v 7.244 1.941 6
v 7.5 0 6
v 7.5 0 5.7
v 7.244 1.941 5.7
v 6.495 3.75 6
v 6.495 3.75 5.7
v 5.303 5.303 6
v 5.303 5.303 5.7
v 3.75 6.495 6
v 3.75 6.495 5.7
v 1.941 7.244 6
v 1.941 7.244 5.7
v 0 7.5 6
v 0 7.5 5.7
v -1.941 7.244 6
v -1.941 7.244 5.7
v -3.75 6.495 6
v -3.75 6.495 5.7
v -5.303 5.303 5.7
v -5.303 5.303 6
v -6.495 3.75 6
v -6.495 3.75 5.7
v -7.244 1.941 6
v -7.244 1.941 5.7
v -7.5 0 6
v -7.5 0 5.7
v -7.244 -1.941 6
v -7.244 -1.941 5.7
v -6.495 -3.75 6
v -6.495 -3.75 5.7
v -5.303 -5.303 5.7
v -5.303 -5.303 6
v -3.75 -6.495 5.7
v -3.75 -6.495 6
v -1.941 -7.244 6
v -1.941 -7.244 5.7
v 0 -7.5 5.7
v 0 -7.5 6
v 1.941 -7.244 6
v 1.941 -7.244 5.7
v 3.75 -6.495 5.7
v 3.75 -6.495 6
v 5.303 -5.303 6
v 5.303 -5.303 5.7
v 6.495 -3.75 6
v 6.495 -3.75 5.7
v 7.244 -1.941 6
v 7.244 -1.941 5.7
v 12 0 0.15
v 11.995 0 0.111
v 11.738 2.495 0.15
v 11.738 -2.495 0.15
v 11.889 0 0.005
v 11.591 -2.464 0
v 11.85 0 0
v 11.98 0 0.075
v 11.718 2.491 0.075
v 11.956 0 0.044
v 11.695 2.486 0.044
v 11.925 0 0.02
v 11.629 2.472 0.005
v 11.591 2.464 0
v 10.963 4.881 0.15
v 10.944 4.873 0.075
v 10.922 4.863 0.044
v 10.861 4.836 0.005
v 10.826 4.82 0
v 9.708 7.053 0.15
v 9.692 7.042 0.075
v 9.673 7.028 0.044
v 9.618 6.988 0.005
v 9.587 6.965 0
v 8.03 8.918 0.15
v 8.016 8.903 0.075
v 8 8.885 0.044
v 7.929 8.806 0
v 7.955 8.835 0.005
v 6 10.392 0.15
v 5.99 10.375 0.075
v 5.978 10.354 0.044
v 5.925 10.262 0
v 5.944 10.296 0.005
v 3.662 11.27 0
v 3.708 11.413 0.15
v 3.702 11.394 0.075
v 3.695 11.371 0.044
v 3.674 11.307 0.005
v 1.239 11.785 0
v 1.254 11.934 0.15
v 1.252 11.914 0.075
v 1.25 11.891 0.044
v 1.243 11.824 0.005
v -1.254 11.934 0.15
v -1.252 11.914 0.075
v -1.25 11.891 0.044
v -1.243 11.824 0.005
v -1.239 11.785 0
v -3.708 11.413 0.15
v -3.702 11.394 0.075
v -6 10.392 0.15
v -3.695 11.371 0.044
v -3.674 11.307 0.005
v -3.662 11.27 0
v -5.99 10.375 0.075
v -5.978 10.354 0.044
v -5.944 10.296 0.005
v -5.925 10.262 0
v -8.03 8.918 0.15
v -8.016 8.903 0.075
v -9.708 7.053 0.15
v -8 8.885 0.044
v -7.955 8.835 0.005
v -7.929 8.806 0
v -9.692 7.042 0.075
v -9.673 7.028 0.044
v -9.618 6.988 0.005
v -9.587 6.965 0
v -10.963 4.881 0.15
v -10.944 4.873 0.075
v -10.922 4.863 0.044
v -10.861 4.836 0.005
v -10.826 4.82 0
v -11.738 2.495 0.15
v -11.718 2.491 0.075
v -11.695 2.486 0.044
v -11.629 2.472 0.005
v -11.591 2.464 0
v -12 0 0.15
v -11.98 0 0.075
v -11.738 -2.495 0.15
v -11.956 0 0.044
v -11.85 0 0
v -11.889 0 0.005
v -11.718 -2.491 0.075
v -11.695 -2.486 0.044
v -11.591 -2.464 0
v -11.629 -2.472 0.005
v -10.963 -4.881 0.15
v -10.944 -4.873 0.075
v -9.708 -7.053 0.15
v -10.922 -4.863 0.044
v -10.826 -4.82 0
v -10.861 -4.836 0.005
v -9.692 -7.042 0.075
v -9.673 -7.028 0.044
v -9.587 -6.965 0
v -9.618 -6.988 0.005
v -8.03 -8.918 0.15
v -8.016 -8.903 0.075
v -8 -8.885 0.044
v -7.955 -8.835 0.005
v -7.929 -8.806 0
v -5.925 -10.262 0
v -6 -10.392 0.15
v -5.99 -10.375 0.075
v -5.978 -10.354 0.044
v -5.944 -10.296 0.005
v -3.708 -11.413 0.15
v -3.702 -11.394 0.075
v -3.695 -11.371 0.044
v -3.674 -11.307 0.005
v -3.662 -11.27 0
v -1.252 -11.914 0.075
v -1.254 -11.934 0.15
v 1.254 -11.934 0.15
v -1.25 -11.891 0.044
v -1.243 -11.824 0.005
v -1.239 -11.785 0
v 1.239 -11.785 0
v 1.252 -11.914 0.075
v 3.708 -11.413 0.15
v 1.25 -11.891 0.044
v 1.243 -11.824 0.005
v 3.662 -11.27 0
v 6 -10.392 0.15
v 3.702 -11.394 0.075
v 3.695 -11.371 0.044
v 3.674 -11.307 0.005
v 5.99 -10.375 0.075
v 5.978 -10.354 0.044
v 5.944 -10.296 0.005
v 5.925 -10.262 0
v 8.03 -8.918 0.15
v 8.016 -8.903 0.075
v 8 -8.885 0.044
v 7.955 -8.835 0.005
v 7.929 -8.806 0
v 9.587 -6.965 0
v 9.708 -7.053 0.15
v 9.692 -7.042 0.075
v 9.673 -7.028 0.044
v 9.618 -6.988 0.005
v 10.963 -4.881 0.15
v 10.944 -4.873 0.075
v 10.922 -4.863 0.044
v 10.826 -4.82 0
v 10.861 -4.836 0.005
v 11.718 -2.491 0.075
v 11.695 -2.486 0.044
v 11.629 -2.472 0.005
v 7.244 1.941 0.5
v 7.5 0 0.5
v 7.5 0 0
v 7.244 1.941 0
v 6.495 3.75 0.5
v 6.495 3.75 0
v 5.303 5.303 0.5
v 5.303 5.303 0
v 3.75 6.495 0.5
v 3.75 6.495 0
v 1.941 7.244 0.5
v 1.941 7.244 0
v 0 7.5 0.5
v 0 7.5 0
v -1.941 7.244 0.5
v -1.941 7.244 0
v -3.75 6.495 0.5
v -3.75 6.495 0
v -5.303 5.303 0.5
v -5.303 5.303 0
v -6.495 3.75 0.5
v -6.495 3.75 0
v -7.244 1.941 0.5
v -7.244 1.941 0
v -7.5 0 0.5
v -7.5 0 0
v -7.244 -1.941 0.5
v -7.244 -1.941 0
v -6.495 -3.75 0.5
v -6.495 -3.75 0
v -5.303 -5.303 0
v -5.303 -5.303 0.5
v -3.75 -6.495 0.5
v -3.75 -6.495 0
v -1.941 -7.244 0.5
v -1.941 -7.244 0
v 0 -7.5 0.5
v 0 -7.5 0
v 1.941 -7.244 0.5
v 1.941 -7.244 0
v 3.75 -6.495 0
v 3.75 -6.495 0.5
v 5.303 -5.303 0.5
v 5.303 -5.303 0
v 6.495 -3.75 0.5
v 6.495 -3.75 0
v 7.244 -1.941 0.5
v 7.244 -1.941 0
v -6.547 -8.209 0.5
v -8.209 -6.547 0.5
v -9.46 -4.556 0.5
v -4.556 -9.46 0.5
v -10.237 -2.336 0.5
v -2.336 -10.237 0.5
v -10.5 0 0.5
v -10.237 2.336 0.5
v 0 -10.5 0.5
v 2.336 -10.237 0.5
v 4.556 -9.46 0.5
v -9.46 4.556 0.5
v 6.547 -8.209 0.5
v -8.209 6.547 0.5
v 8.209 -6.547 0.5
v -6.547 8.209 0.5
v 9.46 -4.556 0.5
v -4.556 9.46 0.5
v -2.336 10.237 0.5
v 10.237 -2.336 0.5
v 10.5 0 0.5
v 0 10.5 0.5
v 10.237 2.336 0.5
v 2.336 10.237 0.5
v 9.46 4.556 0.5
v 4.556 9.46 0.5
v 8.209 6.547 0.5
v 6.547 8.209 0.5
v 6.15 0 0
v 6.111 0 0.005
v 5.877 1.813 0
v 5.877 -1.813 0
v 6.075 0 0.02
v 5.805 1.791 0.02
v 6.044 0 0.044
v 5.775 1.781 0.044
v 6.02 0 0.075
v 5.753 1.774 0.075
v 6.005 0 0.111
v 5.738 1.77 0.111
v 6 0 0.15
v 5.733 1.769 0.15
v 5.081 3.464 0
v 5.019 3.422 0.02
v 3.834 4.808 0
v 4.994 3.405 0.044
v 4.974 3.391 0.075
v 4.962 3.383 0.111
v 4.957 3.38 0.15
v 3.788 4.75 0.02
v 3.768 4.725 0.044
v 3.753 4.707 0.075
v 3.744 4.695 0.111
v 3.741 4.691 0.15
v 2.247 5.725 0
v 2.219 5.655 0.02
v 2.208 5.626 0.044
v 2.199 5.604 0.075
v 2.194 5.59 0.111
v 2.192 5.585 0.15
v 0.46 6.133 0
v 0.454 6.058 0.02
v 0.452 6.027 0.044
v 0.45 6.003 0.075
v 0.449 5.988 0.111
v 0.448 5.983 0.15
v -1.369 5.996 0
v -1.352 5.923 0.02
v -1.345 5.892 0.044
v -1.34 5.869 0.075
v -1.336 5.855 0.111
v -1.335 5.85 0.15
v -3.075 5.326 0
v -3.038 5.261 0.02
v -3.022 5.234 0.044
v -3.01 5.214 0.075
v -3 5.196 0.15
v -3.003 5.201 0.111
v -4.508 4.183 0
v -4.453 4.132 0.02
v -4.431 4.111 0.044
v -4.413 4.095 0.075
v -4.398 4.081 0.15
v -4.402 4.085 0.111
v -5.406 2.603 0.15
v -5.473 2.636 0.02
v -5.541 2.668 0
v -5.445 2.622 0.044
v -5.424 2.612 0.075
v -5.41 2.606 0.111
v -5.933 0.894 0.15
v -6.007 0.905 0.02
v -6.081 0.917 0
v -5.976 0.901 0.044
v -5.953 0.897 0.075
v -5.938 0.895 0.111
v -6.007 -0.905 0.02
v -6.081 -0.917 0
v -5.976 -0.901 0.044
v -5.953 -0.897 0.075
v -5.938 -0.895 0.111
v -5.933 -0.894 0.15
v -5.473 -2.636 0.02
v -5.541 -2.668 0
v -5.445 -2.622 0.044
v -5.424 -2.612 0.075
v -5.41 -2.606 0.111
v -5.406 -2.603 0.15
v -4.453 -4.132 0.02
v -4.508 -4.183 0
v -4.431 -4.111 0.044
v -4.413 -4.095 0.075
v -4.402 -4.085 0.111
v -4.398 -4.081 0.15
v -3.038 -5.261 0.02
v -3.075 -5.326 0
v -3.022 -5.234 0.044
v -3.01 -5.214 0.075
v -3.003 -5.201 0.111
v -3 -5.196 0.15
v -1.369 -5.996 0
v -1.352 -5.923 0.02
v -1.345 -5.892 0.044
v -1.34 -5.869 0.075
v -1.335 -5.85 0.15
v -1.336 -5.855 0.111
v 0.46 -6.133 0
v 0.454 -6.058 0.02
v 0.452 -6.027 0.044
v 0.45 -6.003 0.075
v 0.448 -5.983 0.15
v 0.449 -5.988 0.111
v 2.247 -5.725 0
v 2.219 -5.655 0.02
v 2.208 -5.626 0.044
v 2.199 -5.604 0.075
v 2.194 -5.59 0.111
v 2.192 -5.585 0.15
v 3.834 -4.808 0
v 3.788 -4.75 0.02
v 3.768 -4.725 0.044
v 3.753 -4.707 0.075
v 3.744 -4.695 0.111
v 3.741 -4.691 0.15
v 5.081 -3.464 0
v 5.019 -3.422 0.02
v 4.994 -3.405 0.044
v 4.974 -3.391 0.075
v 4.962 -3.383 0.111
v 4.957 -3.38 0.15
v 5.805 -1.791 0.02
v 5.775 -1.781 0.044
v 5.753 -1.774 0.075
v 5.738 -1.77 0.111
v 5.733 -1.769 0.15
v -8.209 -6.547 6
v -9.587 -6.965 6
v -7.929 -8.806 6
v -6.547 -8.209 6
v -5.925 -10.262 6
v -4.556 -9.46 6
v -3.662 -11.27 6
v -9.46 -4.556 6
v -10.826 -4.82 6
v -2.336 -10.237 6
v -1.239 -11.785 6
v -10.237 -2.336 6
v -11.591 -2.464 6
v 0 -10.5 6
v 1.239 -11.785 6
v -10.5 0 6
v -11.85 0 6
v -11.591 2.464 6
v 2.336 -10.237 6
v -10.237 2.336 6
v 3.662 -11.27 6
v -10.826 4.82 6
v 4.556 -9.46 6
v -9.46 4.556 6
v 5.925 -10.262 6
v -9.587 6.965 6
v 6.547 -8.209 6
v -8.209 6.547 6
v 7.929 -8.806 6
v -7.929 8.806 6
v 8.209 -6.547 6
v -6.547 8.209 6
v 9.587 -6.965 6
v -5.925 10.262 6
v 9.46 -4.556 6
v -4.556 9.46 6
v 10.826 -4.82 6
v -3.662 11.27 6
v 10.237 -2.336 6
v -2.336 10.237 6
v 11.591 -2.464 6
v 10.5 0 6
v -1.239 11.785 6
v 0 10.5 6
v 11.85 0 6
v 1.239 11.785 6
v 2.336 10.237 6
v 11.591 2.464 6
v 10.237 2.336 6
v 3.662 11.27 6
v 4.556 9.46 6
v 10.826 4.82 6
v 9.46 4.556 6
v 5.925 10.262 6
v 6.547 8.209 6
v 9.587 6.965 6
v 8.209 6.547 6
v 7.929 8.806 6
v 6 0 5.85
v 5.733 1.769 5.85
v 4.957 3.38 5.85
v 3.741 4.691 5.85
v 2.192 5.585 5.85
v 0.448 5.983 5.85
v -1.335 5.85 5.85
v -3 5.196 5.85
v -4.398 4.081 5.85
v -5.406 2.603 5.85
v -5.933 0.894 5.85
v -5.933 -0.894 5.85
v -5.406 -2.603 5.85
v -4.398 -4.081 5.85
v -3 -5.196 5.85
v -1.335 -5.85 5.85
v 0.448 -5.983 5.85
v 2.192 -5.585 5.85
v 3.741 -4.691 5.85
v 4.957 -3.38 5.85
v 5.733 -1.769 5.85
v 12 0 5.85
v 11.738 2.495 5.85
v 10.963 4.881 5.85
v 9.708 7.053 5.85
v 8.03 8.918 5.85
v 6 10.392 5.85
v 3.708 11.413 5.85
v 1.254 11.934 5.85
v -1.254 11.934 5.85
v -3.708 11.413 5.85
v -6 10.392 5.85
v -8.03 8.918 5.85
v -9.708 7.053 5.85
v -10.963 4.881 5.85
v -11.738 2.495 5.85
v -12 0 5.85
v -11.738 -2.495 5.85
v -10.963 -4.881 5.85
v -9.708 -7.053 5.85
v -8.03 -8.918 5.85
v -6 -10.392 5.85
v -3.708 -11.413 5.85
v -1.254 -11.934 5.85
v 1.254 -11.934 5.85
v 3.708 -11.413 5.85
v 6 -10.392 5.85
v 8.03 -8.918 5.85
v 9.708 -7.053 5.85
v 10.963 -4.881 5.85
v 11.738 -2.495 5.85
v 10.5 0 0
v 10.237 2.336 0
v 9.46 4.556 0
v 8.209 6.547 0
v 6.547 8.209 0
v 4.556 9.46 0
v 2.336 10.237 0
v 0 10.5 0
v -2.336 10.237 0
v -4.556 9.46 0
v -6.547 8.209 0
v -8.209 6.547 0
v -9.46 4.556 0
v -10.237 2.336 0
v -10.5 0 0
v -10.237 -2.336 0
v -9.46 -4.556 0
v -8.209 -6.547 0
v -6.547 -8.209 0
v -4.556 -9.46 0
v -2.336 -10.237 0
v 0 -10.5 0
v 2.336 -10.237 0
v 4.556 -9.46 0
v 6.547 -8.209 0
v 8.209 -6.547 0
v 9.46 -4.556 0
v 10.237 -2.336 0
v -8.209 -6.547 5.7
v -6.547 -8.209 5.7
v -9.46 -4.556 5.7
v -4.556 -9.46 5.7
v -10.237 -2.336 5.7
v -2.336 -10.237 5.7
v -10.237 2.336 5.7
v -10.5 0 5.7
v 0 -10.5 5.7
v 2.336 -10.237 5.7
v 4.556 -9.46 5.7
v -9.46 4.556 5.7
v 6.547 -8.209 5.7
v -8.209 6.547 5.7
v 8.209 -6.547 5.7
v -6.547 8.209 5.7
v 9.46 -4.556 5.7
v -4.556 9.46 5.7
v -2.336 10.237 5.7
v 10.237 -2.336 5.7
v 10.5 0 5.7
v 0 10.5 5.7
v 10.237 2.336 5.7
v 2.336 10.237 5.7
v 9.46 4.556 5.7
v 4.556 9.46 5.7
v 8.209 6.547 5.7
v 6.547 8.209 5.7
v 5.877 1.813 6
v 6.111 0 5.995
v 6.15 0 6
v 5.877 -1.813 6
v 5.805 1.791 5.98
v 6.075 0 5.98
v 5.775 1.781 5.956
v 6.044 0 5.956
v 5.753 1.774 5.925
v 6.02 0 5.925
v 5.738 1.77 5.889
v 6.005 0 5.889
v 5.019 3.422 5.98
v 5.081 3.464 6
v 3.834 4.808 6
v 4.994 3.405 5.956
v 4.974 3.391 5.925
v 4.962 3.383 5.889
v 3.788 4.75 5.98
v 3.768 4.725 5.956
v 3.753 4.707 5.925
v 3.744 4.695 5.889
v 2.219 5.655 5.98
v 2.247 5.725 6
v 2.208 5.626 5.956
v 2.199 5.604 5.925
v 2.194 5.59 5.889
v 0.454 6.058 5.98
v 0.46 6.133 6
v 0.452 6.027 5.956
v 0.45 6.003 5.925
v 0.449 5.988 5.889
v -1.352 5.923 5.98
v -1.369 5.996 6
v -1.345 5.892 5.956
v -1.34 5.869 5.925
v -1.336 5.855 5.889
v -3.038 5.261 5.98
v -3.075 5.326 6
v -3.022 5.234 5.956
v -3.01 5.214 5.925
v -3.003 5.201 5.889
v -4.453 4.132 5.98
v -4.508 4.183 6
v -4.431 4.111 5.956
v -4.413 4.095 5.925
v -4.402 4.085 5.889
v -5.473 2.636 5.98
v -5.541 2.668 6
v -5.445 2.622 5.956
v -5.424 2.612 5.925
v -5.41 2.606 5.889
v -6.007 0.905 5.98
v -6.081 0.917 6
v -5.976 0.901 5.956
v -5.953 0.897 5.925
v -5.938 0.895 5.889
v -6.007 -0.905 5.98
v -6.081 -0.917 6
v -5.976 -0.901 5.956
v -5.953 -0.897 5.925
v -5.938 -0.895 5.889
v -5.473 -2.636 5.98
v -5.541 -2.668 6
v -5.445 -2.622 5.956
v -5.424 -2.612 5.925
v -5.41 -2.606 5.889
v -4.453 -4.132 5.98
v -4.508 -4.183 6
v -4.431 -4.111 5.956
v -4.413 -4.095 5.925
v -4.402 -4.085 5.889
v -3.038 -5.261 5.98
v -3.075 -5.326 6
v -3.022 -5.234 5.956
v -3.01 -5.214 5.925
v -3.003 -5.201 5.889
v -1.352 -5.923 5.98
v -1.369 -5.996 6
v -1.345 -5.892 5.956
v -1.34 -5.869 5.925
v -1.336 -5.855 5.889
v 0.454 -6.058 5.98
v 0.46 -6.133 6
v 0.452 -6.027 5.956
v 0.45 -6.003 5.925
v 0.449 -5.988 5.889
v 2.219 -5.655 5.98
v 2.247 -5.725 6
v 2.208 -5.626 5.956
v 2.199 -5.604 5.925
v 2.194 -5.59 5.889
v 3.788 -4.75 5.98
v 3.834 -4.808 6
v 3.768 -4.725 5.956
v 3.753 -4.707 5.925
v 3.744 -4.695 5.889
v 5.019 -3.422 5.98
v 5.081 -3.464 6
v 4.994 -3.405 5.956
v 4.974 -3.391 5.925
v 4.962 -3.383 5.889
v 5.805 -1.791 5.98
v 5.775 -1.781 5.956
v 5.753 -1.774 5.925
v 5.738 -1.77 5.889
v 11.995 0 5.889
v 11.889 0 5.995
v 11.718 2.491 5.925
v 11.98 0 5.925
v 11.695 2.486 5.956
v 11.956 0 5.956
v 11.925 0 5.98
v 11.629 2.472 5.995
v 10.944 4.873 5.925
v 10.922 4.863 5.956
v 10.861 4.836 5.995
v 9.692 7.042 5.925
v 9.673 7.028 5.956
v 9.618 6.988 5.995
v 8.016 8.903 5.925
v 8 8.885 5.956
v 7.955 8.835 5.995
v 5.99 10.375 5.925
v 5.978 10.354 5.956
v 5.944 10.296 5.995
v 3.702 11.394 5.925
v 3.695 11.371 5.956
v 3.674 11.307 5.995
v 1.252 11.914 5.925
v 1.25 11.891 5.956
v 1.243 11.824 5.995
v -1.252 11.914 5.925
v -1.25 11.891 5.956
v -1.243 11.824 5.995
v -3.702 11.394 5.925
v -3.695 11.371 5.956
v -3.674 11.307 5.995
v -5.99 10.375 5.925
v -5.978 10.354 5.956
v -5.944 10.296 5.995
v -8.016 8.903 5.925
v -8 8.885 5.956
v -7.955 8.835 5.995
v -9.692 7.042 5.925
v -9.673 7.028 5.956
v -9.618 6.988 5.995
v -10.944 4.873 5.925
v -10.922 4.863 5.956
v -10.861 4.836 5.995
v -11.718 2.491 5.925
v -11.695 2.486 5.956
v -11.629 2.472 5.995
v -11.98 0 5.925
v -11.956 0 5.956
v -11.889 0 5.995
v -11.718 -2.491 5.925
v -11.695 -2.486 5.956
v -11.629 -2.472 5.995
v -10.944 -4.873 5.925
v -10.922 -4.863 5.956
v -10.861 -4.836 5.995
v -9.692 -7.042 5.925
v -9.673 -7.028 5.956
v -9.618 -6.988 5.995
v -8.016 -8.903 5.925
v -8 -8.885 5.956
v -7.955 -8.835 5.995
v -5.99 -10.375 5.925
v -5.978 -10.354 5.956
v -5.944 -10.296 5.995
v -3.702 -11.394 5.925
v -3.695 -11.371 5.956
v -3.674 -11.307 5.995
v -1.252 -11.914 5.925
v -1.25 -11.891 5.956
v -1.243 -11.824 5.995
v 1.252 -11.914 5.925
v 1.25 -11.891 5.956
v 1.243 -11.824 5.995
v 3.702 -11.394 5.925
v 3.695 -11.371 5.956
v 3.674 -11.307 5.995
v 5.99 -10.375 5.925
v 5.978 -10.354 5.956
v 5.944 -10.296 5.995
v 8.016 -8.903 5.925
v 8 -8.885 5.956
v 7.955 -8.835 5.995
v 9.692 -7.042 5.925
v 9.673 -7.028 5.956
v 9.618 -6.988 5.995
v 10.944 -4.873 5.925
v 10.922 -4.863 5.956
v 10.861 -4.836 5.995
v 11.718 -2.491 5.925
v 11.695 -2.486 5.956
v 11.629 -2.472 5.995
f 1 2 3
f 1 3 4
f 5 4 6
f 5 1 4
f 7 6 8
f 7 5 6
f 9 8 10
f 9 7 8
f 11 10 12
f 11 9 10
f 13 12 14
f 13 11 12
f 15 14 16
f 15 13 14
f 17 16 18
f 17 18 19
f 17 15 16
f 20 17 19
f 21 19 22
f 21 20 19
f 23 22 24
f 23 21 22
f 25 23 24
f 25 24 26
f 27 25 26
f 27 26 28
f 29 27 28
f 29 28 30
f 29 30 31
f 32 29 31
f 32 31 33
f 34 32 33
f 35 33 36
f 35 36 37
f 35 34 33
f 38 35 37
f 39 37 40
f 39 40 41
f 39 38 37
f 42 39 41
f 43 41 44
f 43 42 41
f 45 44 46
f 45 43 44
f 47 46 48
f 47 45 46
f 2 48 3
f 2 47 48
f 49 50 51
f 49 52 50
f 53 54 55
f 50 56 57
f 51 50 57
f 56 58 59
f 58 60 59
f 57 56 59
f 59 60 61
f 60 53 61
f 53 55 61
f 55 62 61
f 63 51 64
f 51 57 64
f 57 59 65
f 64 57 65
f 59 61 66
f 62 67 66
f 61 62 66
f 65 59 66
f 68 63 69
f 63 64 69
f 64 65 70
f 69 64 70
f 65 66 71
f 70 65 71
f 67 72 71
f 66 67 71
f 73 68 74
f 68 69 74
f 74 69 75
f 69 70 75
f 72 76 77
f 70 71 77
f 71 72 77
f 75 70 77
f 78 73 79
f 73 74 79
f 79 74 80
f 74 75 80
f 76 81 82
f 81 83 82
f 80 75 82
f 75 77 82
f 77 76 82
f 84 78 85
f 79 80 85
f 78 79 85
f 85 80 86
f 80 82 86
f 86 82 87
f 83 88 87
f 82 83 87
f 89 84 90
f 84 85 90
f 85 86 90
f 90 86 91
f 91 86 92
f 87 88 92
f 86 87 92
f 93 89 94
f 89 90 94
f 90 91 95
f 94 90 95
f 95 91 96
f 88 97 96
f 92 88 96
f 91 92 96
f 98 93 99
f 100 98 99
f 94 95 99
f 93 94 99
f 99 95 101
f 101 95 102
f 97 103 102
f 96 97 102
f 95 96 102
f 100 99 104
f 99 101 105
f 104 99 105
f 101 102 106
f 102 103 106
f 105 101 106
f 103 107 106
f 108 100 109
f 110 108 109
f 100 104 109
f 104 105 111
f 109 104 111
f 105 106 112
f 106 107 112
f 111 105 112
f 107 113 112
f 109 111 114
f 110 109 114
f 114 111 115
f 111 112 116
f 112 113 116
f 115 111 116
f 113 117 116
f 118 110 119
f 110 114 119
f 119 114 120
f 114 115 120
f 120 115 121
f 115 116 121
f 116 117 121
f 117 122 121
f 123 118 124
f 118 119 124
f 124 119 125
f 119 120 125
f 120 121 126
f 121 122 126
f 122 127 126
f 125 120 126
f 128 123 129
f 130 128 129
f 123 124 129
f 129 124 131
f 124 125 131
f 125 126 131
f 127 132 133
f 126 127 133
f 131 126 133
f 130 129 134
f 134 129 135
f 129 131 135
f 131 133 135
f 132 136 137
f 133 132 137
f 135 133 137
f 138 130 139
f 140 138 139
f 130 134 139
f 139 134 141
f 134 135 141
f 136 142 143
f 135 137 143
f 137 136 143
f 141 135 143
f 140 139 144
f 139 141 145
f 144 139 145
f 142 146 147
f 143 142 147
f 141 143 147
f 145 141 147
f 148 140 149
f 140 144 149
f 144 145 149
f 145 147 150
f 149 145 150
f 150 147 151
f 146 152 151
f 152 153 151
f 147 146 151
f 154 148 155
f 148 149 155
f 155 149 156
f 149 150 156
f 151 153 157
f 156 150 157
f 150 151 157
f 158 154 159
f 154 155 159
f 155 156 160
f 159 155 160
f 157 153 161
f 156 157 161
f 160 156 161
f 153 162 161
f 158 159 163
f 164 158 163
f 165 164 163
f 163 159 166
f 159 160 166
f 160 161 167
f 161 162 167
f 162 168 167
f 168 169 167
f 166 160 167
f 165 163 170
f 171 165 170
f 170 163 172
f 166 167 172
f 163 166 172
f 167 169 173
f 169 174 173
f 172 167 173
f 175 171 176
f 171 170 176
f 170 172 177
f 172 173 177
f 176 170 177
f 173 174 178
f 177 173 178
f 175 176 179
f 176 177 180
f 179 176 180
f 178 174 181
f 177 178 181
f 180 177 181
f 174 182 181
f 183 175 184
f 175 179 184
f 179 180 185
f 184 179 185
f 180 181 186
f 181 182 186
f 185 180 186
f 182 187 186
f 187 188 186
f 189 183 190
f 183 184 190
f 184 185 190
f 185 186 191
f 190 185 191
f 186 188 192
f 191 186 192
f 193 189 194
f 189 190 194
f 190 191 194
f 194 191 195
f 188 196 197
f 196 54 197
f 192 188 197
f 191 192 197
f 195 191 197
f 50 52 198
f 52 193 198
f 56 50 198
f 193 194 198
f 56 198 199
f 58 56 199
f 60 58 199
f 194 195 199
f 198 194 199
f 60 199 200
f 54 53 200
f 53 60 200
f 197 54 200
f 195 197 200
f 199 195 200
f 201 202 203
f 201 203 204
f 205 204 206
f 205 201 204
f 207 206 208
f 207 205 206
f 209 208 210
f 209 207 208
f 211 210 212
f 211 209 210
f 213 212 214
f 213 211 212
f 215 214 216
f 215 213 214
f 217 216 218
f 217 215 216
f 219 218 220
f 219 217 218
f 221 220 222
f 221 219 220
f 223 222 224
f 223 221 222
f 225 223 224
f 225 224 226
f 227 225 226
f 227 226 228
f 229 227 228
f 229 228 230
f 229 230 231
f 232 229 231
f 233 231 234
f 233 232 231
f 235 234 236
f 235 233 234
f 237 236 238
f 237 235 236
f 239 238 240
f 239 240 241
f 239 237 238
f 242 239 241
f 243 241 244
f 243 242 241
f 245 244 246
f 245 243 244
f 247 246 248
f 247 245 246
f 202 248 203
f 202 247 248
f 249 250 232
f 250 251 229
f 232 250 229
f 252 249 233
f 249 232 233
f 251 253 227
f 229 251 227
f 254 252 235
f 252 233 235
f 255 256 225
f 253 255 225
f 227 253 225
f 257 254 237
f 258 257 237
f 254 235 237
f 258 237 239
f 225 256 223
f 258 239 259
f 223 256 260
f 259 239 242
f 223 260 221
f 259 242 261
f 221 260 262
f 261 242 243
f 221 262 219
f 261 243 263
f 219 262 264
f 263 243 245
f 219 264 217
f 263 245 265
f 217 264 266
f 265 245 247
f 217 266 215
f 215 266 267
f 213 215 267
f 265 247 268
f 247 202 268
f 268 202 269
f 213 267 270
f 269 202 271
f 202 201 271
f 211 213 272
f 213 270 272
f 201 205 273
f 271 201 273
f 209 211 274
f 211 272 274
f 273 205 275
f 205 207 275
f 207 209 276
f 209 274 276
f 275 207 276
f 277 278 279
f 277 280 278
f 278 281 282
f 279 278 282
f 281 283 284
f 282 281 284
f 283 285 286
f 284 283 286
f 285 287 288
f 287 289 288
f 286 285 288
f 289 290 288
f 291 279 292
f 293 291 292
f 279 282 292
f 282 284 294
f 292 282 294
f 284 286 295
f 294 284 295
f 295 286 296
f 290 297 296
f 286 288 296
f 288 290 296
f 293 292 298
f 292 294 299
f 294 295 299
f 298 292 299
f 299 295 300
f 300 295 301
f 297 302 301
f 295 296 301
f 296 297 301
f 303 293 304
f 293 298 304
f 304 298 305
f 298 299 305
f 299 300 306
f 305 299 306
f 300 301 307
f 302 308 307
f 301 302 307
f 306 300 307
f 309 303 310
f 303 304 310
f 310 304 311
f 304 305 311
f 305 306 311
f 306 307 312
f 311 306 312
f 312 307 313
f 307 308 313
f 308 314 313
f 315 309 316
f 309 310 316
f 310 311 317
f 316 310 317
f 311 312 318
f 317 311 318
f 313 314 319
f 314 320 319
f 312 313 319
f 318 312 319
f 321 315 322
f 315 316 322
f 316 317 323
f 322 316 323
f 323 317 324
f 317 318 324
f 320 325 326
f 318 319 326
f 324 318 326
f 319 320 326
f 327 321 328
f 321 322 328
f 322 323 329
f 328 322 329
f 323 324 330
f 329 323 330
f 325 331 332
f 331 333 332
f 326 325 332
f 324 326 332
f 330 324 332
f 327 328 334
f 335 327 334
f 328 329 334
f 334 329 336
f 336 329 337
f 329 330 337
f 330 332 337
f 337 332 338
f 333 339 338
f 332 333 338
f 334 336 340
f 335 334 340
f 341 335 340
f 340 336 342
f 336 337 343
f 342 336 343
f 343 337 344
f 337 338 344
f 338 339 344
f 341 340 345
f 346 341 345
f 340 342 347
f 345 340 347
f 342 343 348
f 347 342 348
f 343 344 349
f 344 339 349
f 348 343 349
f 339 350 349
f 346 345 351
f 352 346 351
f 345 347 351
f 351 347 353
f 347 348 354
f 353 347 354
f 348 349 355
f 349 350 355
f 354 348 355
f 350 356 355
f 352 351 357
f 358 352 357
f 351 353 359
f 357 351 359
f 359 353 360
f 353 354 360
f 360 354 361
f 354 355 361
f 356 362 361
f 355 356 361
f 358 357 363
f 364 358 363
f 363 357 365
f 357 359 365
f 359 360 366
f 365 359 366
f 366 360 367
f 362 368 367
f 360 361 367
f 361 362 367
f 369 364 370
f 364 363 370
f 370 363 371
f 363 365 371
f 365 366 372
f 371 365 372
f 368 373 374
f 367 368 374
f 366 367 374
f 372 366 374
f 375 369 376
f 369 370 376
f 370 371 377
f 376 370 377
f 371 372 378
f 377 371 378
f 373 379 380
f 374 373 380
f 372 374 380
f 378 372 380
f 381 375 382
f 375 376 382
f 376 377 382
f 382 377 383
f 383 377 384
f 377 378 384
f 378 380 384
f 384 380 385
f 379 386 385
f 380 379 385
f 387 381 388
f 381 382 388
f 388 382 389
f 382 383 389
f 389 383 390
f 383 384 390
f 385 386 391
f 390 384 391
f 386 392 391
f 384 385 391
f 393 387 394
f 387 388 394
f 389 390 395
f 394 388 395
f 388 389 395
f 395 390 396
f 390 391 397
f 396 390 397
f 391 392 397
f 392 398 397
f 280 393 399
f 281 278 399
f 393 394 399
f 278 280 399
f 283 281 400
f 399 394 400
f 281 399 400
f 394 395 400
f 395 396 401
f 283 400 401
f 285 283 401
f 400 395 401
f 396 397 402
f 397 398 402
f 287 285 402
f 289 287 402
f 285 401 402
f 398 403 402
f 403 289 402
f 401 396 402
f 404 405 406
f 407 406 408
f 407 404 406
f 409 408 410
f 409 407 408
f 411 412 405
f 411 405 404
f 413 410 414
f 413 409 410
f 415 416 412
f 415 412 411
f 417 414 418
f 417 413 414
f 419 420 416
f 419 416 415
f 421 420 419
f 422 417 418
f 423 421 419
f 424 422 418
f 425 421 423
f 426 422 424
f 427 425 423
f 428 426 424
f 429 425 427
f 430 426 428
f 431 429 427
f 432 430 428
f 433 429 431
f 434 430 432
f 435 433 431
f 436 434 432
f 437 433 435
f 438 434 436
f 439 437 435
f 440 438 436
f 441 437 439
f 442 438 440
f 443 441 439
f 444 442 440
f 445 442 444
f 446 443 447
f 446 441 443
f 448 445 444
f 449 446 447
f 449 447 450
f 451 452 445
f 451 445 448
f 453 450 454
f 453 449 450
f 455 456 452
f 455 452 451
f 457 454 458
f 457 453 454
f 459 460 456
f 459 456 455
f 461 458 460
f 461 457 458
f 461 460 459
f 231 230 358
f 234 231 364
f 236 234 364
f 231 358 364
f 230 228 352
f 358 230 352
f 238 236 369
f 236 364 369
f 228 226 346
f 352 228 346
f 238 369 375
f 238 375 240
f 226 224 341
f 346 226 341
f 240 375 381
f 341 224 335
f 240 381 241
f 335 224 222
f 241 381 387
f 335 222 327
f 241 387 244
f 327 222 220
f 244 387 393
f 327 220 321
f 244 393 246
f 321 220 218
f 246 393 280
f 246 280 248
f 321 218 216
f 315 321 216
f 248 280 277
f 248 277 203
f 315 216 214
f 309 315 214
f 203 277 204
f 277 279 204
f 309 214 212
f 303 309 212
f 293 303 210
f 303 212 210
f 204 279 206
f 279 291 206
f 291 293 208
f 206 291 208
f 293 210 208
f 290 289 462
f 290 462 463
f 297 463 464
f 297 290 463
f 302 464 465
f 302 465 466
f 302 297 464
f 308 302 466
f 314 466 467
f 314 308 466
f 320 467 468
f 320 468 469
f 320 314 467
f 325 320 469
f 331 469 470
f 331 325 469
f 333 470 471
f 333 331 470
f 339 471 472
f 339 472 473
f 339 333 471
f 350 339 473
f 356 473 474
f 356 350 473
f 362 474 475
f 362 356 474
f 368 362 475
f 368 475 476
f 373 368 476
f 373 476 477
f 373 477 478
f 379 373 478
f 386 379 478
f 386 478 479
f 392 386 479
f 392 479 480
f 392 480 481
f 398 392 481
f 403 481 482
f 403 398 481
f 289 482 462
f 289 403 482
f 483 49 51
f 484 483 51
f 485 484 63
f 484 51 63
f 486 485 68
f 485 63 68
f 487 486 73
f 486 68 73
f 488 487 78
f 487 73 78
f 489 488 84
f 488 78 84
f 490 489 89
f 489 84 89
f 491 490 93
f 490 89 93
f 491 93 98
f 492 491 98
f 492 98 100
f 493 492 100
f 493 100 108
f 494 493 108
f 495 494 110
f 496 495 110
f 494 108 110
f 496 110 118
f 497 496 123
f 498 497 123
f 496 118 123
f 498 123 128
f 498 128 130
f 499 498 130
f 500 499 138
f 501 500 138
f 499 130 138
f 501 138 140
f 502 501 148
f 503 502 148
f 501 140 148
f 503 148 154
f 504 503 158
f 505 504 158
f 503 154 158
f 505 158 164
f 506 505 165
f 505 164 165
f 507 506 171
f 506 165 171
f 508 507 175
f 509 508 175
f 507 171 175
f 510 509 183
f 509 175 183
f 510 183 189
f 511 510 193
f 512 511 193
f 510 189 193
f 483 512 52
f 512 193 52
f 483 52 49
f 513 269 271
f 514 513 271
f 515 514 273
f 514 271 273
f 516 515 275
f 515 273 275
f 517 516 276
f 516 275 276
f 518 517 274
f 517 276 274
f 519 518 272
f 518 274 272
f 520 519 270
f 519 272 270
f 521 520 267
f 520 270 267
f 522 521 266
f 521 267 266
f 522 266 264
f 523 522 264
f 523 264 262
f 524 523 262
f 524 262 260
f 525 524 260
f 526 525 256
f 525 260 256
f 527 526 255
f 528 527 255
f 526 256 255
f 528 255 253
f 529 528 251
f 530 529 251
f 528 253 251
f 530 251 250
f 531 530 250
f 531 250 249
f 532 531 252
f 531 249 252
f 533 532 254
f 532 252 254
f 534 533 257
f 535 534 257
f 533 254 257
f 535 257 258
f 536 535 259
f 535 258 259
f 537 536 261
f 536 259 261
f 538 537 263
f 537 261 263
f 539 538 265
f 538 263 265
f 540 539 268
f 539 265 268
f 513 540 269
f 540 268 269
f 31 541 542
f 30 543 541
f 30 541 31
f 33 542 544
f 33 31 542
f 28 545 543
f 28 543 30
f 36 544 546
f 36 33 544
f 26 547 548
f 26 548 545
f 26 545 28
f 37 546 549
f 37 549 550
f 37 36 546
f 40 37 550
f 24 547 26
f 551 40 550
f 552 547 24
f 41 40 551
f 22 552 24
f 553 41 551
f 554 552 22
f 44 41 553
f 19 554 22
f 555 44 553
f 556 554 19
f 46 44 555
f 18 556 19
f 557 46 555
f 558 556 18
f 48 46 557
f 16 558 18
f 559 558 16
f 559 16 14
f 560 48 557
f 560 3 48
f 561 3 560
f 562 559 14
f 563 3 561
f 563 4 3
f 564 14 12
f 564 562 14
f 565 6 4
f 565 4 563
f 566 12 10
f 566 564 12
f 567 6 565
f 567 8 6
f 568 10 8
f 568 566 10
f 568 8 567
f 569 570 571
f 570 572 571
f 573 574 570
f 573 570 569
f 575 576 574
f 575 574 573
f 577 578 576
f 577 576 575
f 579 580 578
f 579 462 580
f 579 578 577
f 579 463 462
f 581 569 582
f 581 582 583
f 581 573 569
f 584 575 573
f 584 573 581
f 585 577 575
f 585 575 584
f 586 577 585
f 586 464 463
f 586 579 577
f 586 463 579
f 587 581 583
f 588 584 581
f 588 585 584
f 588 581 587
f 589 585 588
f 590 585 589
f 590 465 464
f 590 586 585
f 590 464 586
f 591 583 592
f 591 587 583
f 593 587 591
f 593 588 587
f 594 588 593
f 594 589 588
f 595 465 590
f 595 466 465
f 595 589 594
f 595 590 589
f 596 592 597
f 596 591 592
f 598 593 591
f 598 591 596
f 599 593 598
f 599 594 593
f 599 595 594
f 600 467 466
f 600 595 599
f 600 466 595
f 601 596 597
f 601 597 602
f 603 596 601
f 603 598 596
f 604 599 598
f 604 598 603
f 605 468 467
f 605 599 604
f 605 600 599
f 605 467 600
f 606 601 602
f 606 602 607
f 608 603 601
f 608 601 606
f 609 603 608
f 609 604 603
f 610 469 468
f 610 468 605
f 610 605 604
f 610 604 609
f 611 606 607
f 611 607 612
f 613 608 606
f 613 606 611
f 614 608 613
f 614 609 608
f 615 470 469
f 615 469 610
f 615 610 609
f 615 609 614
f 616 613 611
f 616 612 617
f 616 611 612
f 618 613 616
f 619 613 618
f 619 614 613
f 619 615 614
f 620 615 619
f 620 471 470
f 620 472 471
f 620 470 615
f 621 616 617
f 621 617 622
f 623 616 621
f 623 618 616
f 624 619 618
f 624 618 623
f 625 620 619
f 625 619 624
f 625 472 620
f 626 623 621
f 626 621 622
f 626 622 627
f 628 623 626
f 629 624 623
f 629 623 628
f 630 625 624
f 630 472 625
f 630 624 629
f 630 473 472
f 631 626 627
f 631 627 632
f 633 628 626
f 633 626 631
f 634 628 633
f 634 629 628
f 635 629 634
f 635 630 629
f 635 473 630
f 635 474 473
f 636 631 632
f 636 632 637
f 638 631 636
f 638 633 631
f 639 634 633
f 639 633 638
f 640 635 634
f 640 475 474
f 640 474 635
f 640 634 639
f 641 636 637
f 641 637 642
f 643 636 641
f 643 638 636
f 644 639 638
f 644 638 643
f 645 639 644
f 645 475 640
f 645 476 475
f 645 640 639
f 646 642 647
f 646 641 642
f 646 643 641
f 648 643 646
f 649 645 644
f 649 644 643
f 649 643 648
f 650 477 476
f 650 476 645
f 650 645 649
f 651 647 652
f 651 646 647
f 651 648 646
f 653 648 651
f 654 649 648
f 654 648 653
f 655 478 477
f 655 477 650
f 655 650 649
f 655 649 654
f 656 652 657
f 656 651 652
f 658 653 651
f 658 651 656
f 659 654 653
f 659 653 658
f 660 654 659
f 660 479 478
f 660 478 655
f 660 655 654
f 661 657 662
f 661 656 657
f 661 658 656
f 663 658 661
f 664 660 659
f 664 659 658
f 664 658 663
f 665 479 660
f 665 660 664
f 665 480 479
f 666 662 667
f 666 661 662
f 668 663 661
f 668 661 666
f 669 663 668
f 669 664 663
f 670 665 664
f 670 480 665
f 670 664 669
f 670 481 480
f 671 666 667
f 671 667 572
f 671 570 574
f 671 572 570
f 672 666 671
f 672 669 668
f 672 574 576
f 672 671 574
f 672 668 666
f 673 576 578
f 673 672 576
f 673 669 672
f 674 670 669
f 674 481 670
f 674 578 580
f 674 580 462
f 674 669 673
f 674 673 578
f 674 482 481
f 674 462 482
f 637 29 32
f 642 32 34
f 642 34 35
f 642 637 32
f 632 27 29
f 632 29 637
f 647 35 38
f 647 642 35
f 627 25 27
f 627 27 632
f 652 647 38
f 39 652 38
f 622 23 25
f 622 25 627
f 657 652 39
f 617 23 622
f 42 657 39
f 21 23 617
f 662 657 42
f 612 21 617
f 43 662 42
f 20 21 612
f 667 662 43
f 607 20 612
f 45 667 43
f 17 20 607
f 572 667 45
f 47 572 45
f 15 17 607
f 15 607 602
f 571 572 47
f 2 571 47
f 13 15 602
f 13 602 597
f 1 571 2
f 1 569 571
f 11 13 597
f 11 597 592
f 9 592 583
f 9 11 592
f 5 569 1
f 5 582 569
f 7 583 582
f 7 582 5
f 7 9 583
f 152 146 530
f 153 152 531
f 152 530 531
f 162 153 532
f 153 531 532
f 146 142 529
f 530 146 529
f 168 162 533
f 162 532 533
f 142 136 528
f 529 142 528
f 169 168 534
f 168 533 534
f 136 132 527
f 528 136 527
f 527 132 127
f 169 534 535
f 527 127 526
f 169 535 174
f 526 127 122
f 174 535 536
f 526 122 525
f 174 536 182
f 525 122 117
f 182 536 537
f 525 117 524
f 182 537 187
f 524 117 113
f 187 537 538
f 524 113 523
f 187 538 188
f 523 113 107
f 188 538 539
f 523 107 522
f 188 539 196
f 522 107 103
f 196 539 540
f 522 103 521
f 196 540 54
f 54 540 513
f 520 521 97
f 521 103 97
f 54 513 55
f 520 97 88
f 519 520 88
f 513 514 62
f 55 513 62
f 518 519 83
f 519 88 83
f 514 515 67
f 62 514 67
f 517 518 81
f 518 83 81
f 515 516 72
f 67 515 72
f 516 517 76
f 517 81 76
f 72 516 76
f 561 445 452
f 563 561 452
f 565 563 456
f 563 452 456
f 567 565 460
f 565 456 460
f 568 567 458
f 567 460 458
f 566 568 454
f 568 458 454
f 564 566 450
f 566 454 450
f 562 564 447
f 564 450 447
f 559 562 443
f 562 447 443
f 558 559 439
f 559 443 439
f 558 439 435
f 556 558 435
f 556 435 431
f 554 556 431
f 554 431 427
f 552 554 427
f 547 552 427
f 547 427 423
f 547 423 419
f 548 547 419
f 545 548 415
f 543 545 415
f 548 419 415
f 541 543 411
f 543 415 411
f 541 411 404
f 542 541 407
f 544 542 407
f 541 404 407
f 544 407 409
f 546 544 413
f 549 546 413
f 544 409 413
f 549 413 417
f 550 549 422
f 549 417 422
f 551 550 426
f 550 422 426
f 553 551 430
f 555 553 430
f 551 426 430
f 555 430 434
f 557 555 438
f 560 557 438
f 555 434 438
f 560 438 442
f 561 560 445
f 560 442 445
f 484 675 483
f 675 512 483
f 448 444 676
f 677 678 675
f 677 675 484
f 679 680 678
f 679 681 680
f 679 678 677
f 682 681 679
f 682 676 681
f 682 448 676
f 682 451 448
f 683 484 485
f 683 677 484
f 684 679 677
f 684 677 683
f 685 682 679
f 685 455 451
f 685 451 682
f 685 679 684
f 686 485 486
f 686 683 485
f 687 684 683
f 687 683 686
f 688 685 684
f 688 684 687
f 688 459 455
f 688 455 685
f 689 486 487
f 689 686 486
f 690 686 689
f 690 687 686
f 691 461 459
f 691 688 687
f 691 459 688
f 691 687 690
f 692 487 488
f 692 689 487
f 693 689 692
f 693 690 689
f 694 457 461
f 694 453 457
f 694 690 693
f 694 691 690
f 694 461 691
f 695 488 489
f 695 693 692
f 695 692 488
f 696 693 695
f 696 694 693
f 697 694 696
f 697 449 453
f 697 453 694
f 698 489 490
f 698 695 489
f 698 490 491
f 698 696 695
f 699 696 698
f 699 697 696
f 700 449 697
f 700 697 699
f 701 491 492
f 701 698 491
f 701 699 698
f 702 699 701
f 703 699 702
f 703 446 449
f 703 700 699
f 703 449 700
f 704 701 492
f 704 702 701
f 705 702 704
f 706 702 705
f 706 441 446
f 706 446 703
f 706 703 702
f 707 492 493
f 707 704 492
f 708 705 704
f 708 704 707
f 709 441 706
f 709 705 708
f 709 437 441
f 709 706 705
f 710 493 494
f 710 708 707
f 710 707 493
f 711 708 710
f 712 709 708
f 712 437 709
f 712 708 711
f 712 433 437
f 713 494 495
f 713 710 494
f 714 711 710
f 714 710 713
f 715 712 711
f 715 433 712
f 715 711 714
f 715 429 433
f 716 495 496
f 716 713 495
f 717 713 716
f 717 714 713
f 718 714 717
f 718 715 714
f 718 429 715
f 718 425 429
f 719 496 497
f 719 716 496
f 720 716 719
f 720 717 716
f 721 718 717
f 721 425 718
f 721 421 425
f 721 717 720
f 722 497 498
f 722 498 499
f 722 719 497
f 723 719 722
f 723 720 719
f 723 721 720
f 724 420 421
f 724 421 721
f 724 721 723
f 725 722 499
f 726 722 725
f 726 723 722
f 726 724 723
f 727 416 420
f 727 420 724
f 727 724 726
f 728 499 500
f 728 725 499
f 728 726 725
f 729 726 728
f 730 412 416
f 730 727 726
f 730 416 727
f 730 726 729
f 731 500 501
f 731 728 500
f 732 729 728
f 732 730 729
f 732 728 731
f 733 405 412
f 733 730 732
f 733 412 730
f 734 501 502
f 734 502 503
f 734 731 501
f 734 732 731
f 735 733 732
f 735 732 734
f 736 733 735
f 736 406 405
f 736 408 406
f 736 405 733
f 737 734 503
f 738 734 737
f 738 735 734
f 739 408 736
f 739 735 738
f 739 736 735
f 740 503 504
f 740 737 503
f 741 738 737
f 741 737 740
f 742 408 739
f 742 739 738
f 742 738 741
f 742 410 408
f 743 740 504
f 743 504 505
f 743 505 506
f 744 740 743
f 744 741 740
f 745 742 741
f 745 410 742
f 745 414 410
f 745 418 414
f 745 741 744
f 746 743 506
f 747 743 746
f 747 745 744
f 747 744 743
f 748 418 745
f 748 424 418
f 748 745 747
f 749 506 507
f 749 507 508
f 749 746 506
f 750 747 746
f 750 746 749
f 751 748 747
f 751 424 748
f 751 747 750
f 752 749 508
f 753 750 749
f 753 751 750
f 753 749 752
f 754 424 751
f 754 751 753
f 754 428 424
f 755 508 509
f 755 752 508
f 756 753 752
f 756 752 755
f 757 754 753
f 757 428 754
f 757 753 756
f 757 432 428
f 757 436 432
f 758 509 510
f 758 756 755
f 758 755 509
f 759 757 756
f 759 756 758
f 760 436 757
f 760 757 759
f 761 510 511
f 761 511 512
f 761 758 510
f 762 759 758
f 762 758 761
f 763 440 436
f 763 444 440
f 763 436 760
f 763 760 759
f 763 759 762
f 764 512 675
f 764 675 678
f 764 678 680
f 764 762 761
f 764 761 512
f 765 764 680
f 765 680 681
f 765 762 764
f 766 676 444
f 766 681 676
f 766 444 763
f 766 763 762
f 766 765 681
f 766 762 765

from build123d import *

# Parameters (mm, degrees)
SKETCH1_R           = 12
SKETCH1_R_2         = 6
BOSS_EXTRUDE1_DEPTH = 6
SKETCH2_R           = 10.5
SKETCH2_R_2         = 7.5
CUT_EXTRUDE1_DEPTH  = 0.3
CUT_EXTRUDE2_START  = -5.5
SKETCH2_2_R         = 10.5
SKETCH2_2_R_2       = 7.5
CUT_EXTRUDE2_DEPTH  = 0.5
FILLET1_R           = 0.15


with BuildPart() as part:
    # Sketch1 → Boss-Extrude1 (new body)
    with BuildSketch(Plane.XY):
        Circle(SKETCH1_R)
        Circle(SKETCH1_R_2, mode=Mode.SUBTRACT)
    extrude(amount=BOSS_EXTRUDE1_DEPTH)

    # Sketch2 → Cut-Extrude1 (cut)
    with BuildSketch(Plane.XY.offset(6)):
        Circle(SKETCH2_R)
        Circle(SKETCH2_R_2, mode=Mode.SUBTRACT)
    extrude(amount=-CUT_EXTRUDE1_DEPTH, mode=Mode.SUBTRACT)

    # Sketch2<2> → Cut-Extrude2 (cut)
    with BuildSketch(Plane.XY.offset(6).offset(CUT_EXTRUDE2_START)):
        Circle(SKETCH2_2_R)
        Circle(SKETCH2_2_R_2, mode=Mode.SUBTRACT)
    extrude(amount=-CUT_EXTRUDE2_DEPTH, mode=Mode.SUBTRACT)

    # Fillet1
    fillet1_edges = [part.edges().sort_by_distance(p)[0] for p in [
        (-12, 0, 0),
        (-12, 0, 6),
        (-6, 0, 0),
        (-6, 0, 6),
    ]]
    fillet(fillet1_edges, radius=FILLET1_R)


solid = part.part
